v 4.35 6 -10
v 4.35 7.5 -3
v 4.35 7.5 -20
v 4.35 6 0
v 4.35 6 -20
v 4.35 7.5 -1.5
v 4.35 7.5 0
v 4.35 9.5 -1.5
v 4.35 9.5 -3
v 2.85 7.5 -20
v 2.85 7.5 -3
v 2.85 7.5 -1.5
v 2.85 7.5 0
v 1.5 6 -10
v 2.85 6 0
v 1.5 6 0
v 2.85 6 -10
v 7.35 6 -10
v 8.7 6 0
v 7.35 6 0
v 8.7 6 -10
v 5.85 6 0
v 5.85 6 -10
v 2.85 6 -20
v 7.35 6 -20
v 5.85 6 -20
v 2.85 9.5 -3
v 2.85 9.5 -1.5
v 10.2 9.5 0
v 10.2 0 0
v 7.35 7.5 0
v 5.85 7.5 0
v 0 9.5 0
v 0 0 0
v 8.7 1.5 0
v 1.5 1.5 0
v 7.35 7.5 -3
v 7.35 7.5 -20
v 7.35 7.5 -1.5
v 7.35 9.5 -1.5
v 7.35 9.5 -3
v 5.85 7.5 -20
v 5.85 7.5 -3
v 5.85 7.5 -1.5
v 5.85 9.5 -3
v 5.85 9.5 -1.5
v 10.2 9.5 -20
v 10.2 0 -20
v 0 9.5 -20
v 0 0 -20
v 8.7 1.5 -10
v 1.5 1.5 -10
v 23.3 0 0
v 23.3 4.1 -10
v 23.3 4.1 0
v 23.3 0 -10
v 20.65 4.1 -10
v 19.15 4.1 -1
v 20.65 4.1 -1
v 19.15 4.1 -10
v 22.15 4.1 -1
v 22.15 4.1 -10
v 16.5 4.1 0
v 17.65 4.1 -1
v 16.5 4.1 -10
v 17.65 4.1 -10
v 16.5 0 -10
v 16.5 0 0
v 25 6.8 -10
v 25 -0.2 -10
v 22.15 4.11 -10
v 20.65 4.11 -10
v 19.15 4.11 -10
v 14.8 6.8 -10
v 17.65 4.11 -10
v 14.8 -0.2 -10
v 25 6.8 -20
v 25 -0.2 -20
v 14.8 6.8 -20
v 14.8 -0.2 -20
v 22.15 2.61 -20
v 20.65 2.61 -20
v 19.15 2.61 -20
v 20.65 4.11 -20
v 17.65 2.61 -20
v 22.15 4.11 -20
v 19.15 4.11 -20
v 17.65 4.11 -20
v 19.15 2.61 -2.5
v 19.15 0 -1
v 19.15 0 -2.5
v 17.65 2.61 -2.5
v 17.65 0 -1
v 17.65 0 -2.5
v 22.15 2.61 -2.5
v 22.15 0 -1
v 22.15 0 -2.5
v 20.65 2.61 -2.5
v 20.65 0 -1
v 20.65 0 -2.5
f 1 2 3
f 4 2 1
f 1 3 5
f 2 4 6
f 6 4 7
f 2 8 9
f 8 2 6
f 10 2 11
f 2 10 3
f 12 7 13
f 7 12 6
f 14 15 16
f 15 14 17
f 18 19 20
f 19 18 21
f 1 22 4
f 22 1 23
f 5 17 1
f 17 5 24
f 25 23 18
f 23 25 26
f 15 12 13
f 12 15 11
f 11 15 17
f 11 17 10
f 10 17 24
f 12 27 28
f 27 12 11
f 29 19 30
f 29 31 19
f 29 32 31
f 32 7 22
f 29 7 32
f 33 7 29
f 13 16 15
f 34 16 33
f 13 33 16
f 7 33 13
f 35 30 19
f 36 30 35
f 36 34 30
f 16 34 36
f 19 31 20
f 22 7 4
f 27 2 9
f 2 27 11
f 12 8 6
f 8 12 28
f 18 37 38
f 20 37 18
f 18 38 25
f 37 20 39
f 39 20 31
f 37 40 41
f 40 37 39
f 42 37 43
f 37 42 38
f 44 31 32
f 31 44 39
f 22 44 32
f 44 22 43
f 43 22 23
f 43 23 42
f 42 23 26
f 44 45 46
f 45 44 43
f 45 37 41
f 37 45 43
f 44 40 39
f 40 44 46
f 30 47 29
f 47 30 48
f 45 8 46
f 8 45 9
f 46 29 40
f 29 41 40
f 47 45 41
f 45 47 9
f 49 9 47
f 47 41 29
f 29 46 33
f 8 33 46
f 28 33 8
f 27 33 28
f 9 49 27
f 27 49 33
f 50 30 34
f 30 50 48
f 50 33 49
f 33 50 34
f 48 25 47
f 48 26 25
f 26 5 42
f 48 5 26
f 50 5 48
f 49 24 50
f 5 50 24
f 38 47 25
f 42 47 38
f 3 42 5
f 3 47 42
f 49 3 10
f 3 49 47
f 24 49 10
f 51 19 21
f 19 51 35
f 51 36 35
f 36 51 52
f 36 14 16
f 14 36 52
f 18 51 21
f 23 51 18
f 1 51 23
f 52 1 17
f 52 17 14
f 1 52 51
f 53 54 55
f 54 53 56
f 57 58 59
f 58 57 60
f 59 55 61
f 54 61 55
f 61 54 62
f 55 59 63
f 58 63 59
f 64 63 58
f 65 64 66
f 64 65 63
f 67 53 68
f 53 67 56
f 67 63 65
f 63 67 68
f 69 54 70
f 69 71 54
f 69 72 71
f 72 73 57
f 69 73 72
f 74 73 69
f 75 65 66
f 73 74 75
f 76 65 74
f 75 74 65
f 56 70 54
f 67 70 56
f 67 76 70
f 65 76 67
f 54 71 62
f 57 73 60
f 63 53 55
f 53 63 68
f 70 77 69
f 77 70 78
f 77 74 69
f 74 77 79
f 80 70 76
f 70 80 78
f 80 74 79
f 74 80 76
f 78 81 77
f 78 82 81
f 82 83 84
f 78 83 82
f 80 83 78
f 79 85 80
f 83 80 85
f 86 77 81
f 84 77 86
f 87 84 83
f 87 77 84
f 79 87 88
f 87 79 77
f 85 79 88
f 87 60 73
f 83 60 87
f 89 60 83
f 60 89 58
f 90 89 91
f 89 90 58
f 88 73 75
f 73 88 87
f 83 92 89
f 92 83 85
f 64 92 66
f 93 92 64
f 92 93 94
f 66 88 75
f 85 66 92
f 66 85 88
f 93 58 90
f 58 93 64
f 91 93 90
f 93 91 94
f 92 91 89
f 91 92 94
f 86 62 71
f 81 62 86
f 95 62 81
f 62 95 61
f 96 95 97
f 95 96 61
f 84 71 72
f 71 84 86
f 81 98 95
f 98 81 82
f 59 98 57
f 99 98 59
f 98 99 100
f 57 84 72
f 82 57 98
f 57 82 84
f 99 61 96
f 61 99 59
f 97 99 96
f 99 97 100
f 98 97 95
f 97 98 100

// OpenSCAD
// Male and female sockets for Ikea LEDBERG LED strips.  These are designed to
// be filled with 22 gauge solid core wire (or similar).  Multi-filament wire
// also works if you twist it. It'll work even better if you tin it. All units
// are in mm.

// Original design by Steve Pomeroy (https://www.thingiverse.com/xxv/)
//  under CC-BY-SA (https://creativecommons.org/licenses/by-sa/3.0/) in 2013.
//  See https://www.thingiverse.com/thing:121247
//
// This design is an adaption for newer Ledberg (bought in Mar. 2023)
// Nils Andresen, Mar. 2023, CC-BY-SA
//

// Size of male connector. This is the base connector size.
male_x=7;
male_y=10;
male_z=4.3;

// thickness of the outer wall.
wall_thickness=1.5;

// size of female housing.
female_y=20;

// extra height above connector for electronics
female_z_extra=2;
male_z_extra=1;

// The amount of minor offset to make differences work correctly.
diff_offset=.01;

// contact channel width
contact_channel_x=1.5;
contact_channel_y=40;
contact_channel_z=1.5;

// how much of a lip to give the contact channel at the end of the socket
contact_channel_recess_male=1;
// No lip on the female, as it could potentially make the bar get stuck.
contact_channel_recess_female=0;

// The distance between the centers of the two contacts.
contact_channel_separation=3;

// How much extra to add to account for extrusion inaccuracies. This makes the male smaller and the female larger. 0.1 works well on a Lulzbot 0.5mm nozzle, 3mm filament.
extrusion_offset=0.1;

male_contact_z=male_z-contact_channel_z-wall_thickness+diff_offset-extrusion_offset*2;

module contact_channel(x,y,z,recess,end_lock_z,end_lock_z_offset,end_lock_y_offset){
  // one contact left
  translate([(wall_thickness + x/2)-contact_channel_separation/2-contact_channel_x/2,recess,z+wall_thickness]){
    cube([contact_channel_x,contact_channel_y,contact_channel_z]);
	  translate([0,end_lock_y_offset,end_lock_z_offset-wall_thickness]){
		cube([contact_channel_x,contact_channel_x,end_lock_z]);
	  }
  }
  // right contact
  translate([(wall_thickness + x/2)+contact_channel_separation/2-contact_channel_x/2,recess,z+wall_thickness]){
    cube([contact_channel_x,contact_channel_y,contact_channel_z]);
	  translate([0,end_lock_y_offset,end_lock_z_offset-wall_thickness]){
		cube([contact_channel_x,contact_channel_x,end_lock_z]);
	  }
  }
}

module female() {
  difference() {
  // Outer casing
  cube([male_x+wall_thickness*2+extrusion_offset*2,
    female_y,
    male_z+wall_thickness*2 + female_z_extra+extrusion_offset*2]);

  // Socket hole
  translate([wall_thickness,-diff_offset,wall_thickness]){
    cube([male_x + extrusion_offset*2,male_y+diff_offset,male_z + extrusion_offset*2]);
  }
  contact_channel(male_x +extrusion_offset*2,male_y,male_z+ extrusion_offset*2,contact_channel_recess_female,male_z + wall_thickness*2+female_z_extra+extrusion_offset*2,0,wall_thickness);
  }
}

module male(){
  difference(){
  union(){
    translate([wall_thickness,0,0]){
    cube([male_x - extrusion_offset*2, male_y, male_z - extrusion_offset*2]);
    }
    translate([-extrusion_offset*2,male_y,-extrusion_offset*2]){
    cube([male_x+wall_thickness*2 + extrusion_offset*2, male_y, male_z+wall_thickness+male_z_extra+extrusion_offset*2]);
    }
  }
  contact_channel(male_x-extrusion_offset*2,male_y, male_contact_z, contact_channel_recess_male, male_z, -male_contact_z,0);
  }
}

rotation=-90;

// Rotating them -90 degrees made the prints come out the best.
rotate([rotation,0,0]){
  female();
}

translate([15,0,0]){
  rotate([rotation,0,0]){
	male();
  }
}
